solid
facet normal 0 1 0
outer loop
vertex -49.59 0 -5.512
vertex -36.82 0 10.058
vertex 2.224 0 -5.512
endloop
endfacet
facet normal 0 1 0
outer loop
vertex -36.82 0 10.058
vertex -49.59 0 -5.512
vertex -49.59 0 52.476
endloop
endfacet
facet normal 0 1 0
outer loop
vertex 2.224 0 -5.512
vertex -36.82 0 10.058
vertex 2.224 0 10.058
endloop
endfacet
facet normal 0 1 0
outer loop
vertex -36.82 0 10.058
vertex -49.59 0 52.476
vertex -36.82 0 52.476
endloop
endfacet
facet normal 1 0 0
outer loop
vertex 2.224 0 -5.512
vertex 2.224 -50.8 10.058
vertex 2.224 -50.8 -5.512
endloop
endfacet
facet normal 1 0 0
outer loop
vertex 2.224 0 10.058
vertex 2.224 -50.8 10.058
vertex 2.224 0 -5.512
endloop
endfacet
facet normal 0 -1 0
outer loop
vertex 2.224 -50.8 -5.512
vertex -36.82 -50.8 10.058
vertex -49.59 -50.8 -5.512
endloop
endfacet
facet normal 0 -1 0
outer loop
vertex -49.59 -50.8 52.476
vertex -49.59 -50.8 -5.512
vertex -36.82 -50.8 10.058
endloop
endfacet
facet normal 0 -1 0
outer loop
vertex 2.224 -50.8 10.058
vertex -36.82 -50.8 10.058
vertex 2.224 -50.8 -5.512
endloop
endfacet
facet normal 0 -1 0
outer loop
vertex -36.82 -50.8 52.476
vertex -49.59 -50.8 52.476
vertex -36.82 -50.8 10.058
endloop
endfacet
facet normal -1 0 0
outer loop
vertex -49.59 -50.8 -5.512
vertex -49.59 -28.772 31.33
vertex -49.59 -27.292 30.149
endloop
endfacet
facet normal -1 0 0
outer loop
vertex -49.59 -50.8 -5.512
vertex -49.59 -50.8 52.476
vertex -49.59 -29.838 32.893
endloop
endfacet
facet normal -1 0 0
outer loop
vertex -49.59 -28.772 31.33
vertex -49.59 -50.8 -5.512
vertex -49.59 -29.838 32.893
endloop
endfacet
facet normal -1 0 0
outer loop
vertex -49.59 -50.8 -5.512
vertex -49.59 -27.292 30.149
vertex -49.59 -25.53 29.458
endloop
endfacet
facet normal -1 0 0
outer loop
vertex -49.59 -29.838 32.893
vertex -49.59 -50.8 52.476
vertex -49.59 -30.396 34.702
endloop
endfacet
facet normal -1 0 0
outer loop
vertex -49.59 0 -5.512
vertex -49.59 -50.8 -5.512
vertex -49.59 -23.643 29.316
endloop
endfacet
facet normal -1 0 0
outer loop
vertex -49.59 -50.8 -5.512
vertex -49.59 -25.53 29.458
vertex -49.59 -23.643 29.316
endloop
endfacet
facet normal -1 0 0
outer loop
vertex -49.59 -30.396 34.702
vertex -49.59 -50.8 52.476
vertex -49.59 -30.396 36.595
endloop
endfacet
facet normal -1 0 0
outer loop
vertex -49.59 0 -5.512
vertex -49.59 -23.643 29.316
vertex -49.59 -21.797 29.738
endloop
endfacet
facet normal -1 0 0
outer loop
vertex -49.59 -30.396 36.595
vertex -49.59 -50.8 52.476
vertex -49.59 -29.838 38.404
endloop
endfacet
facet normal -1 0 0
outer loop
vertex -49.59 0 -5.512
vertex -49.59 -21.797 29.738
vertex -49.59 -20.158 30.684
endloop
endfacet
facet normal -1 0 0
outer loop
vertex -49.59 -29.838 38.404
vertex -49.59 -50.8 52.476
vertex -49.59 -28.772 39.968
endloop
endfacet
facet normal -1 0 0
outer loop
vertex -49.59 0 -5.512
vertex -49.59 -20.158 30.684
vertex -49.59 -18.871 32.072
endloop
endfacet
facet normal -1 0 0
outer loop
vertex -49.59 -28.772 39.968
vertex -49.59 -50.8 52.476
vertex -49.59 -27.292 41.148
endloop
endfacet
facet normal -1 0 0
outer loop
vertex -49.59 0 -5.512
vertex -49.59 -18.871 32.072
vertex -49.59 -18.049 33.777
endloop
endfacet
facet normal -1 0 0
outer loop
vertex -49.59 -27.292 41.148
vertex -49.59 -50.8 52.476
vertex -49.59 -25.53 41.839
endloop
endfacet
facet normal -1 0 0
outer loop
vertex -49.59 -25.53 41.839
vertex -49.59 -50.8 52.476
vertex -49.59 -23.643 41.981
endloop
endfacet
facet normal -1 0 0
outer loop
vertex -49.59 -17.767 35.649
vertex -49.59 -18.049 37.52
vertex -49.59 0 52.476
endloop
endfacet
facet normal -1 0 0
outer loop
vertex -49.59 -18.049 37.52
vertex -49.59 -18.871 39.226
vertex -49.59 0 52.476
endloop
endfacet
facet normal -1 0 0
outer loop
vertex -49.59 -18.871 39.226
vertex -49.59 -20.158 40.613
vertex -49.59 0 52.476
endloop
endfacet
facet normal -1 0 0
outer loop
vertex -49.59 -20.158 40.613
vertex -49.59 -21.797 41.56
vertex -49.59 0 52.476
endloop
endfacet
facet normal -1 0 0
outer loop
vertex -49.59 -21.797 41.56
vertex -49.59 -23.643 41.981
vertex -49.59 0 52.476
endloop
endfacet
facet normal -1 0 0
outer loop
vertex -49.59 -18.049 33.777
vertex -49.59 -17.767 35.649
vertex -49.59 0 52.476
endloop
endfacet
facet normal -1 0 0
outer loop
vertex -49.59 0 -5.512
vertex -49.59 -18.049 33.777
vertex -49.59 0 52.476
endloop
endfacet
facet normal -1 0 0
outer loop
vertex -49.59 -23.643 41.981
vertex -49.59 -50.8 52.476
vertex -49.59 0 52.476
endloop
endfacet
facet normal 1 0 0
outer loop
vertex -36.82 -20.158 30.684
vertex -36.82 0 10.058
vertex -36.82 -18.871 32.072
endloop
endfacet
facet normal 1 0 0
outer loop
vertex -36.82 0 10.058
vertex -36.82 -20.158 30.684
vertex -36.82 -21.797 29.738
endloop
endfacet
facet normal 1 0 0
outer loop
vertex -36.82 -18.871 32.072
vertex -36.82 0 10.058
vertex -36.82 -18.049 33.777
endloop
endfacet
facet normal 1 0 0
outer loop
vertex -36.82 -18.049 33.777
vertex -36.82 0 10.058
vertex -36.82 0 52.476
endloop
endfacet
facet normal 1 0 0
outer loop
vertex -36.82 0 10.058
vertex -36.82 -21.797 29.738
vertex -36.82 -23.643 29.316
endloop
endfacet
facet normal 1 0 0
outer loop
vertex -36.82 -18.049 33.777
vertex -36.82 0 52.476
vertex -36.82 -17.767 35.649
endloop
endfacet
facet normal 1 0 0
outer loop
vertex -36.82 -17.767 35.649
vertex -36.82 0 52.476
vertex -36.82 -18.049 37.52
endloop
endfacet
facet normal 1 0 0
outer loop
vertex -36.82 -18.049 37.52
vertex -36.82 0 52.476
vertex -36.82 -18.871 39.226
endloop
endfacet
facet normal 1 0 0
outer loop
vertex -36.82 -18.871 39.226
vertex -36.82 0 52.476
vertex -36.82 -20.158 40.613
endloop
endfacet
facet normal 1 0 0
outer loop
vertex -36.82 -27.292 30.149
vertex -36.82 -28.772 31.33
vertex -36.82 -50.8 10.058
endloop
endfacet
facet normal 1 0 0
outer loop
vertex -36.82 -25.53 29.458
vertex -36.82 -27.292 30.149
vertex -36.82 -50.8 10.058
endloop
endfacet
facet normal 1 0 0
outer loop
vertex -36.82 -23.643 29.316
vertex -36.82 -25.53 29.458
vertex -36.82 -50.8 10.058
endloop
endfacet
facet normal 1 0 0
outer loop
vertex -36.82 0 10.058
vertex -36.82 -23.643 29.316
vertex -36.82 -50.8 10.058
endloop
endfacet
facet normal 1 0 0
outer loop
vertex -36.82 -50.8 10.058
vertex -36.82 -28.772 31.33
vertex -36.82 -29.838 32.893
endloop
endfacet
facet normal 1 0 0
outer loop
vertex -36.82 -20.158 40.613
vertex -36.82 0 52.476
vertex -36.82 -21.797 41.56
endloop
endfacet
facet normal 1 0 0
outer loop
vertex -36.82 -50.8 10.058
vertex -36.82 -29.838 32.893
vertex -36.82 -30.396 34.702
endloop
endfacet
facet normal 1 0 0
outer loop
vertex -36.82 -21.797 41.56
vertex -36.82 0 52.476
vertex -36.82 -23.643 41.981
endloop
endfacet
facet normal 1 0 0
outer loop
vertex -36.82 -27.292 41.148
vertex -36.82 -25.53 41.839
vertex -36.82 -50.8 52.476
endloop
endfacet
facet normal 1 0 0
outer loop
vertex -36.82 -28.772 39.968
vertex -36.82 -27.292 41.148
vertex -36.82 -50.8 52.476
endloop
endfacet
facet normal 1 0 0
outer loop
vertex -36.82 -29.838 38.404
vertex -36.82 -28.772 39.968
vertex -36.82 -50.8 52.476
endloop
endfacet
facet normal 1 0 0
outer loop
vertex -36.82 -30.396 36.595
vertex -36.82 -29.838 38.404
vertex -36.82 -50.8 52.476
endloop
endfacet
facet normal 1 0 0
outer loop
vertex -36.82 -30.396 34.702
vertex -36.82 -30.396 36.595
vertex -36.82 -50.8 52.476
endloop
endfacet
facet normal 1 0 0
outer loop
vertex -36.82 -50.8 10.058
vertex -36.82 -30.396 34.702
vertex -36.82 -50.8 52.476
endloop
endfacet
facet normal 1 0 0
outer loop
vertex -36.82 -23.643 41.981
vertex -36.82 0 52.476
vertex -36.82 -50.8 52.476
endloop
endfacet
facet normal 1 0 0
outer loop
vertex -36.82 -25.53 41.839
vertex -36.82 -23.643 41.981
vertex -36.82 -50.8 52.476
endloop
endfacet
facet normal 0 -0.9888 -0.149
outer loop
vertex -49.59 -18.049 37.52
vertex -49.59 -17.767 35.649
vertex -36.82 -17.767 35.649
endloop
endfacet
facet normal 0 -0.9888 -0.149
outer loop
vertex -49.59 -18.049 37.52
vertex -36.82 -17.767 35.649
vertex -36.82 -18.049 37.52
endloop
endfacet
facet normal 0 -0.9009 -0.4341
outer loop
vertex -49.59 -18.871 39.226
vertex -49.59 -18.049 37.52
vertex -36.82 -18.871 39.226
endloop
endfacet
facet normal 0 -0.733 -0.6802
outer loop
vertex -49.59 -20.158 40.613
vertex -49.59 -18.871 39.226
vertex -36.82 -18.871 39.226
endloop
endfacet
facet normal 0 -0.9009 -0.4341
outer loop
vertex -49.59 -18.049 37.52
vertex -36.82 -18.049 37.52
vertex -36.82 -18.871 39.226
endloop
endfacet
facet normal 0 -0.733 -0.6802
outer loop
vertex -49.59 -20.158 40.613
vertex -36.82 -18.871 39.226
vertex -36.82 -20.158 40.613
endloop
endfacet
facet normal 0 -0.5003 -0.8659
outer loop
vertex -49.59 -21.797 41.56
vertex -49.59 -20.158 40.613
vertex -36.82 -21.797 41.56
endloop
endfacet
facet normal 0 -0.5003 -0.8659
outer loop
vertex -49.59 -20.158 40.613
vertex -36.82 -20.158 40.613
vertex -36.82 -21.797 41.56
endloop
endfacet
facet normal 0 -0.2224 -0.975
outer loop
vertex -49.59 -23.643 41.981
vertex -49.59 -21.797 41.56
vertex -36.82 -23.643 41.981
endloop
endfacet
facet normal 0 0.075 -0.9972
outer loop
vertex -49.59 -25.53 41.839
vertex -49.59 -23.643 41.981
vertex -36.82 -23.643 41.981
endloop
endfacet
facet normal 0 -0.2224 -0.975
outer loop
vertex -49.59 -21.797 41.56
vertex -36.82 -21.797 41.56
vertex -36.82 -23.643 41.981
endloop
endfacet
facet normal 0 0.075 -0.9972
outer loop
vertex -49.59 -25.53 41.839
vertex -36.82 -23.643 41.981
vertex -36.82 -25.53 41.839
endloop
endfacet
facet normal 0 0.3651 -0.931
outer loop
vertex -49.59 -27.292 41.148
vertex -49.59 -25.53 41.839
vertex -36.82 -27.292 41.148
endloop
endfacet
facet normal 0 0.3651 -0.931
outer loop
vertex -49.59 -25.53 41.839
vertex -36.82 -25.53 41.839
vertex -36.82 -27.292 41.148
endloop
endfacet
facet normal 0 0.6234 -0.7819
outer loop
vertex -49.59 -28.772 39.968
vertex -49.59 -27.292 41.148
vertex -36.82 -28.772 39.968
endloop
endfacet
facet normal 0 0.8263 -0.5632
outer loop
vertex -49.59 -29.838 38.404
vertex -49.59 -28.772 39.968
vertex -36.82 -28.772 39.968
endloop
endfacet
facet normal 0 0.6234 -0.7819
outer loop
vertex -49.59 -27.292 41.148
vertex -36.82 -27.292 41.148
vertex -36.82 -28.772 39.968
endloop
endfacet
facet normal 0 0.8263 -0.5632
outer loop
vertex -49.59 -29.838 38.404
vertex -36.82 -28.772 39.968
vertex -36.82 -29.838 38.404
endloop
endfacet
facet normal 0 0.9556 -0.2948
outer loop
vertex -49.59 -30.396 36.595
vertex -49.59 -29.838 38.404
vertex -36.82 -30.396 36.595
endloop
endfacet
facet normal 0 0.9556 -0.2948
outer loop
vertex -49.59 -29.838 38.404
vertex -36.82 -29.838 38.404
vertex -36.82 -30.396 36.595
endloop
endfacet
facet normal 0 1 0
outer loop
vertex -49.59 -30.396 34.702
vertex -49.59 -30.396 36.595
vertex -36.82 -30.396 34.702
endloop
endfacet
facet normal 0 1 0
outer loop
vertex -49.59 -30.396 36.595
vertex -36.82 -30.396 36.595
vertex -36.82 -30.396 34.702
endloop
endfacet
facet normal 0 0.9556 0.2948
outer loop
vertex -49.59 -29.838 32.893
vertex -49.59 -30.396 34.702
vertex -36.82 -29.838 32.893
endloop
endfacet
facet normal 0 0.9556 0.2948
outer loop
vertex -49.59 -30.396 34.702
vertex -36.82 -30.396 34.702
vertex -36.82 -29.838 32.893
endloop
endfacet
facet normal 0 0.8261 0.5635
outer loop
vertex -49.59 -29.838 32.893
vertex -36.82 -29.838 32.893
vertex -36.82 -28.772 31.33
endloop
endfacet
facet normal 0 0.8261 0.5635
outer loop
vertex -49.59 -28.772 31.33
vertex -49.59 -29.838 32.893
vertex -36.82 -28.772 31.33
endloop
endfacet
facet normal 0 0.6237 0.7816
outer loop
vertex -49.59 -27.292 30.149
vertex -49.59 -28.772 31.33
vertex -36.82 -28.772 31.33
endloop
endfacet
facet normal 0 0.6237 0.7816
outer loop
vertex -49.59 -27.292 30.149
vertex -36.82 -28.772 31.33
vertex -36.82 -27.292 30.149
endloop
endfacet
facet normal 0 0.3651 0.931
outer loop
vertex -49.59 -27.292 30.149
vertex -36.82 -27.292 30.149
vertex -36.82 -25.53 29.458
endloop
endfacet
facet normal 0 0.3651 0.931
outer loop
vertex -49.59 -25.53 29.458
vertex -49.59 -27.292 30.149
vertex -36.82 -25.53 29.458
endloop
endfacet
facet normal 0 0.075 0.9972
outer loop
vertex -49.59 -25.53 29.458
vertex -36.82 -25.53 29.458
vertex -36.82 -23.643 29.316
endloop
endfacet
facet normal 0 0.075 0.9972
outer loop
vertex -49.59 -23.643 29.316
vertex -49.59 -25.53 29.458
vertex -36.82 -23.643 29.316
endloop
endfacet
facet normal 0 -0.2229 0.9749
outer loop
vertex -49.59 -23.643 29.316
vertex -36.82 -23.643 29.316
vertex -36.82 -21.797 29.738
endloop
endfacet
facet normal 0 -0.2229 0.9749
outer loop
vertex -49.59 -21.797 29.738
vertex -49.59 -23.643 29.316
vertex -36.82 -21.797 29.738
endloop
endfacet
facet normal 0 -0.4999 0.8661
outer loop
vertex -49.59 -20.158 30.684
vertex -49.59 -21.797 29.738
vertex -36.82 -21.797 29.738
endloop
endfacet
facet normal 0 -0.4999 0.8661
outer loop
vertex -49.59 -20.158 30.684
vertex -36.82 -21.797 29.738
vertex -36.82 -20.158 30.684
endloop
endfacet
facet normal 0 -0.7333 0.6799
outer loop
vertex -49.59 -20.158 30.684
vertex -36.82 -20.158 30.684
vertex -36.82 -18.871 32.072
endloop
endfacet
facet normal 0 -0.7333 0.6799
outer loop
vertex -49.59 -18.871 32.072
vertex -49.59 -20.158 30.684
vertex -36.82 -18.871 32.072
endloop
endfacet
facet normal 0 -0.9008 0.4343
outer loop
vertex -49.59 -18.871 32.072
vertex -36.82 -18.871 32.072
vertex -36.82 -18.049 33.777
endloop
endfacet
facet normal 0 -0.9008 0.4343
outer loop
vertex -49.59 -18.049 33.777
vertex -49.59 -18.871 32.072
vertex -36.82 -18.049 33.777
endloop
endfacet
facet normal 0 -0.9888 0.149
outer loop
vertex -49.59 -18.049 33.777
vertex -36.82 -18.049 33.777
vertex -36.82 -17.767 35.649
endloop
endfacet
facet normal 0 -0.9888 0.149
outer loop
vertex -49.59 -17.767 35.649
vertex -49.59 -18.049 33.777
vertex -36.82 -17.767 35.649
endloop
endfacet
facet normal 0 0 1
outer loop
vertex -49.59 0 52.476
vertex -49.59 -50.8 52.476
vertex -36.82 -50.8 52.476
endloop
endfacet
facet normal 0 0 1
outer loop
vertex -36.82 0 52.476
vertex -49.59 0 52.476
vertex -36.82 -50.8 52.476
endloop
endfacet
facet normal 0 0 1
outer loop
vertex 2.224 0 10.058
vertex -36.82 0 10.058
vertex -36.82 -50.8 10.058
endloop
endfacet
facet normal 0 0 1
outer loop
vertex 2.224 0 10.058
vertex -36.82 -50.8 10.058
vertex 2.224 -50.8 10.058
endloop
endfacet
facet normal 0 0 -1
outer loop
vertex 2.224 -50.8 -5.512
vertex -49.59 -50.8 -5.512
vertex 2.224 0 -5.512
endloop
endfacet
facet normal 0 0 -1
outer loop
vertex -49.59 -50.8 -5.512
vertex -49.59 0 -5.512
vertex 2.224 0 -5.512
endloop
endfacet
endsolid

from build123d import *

# Parameters (mm, degrees)
F0_W     = 51.813559141
F0_H     = 32.5880763121
F1_DEPTH = 25.4
F2_DEPTH = 25.4
F3_DEPTH = 25.4
F4_DEPTH = 7.1882
F6_DEPTH = 37.846
F7_R     = 6.35
F8_DEPTH = 50.8
F9_DEPTH = 4.572


# Not quite as in the source:
# - a feature of the source that left no trace in its solid (it failed there, or was rolled back) is left out


with BuildPart() as f1:
    # F0 (on Front) → F1 (new body)
    with BuildSketch(Plane.XZ):
        with Locations((-23.6830220092, 10.7818876859)):
            Rectangle(F0_W, F0_H)
    extrude(amount=F1_DEPTH)

    # F2 (add): a face of the model
    f2_faces = [f1.faces().sort_by_distance(p)[0] for p in [
        (-23.6830220092, -25.4, 10.7818876859),
    ]]
    extrude(f2_faces, amount=F2_DEPTH)

    # F3 (add): a face of the model
    f3_faces = [f1.faces().sort_by_distance(p)[0] for p in [
        (-23.6830220092, -25.4, 27.0759258419),
    ]]
    extrude(f3_faces, amount=F3_DEPTH)

    # F4 (add): a face of the model
    f4_faces = [f1.faces().sort_by_distance(p)[0] for p in [
        (-23.6830220092, -25.4, 52.4759258419),
    ]]
    extrude(f4_faces, amount=-F4_DEPTH)

    # F5 (on face) → F6 (cut)
    with BuildSketch(Plane.XY.offset(52.4759258419)):
        Polygon((-36.8200466037, 0), (-36.8200466037, -25.4), (-36.8200466037, -50.8), (2.2237575613, -50.8), (2.2237575613, 0), align=None)
    extrude(amount=-F6_DEPTH, mode=Mode.SUBTRACT)

    # F7 (on face) → F8 (cut)
    with BuildSketch(Plane.YZ.offset(-36.8200466037)):
        with Locations((-24.1173226386, 35.6486514211)):
            Circle(F7_R)
    extrude(amount=-F8_DEPTH, mode=Mode.SUBTRACT)

    # F9 (cut): a face of the model
    f9_faces = [f1.faces().sort_by_distance(p)[0] for p in [
        (-17.2981445212, -25.4, 14.6299258419),
    ]]
    extrude(f9_faces, amount=-F9_DEPTH, mode=Mode.SUBTRACT)


solid = f1.part
